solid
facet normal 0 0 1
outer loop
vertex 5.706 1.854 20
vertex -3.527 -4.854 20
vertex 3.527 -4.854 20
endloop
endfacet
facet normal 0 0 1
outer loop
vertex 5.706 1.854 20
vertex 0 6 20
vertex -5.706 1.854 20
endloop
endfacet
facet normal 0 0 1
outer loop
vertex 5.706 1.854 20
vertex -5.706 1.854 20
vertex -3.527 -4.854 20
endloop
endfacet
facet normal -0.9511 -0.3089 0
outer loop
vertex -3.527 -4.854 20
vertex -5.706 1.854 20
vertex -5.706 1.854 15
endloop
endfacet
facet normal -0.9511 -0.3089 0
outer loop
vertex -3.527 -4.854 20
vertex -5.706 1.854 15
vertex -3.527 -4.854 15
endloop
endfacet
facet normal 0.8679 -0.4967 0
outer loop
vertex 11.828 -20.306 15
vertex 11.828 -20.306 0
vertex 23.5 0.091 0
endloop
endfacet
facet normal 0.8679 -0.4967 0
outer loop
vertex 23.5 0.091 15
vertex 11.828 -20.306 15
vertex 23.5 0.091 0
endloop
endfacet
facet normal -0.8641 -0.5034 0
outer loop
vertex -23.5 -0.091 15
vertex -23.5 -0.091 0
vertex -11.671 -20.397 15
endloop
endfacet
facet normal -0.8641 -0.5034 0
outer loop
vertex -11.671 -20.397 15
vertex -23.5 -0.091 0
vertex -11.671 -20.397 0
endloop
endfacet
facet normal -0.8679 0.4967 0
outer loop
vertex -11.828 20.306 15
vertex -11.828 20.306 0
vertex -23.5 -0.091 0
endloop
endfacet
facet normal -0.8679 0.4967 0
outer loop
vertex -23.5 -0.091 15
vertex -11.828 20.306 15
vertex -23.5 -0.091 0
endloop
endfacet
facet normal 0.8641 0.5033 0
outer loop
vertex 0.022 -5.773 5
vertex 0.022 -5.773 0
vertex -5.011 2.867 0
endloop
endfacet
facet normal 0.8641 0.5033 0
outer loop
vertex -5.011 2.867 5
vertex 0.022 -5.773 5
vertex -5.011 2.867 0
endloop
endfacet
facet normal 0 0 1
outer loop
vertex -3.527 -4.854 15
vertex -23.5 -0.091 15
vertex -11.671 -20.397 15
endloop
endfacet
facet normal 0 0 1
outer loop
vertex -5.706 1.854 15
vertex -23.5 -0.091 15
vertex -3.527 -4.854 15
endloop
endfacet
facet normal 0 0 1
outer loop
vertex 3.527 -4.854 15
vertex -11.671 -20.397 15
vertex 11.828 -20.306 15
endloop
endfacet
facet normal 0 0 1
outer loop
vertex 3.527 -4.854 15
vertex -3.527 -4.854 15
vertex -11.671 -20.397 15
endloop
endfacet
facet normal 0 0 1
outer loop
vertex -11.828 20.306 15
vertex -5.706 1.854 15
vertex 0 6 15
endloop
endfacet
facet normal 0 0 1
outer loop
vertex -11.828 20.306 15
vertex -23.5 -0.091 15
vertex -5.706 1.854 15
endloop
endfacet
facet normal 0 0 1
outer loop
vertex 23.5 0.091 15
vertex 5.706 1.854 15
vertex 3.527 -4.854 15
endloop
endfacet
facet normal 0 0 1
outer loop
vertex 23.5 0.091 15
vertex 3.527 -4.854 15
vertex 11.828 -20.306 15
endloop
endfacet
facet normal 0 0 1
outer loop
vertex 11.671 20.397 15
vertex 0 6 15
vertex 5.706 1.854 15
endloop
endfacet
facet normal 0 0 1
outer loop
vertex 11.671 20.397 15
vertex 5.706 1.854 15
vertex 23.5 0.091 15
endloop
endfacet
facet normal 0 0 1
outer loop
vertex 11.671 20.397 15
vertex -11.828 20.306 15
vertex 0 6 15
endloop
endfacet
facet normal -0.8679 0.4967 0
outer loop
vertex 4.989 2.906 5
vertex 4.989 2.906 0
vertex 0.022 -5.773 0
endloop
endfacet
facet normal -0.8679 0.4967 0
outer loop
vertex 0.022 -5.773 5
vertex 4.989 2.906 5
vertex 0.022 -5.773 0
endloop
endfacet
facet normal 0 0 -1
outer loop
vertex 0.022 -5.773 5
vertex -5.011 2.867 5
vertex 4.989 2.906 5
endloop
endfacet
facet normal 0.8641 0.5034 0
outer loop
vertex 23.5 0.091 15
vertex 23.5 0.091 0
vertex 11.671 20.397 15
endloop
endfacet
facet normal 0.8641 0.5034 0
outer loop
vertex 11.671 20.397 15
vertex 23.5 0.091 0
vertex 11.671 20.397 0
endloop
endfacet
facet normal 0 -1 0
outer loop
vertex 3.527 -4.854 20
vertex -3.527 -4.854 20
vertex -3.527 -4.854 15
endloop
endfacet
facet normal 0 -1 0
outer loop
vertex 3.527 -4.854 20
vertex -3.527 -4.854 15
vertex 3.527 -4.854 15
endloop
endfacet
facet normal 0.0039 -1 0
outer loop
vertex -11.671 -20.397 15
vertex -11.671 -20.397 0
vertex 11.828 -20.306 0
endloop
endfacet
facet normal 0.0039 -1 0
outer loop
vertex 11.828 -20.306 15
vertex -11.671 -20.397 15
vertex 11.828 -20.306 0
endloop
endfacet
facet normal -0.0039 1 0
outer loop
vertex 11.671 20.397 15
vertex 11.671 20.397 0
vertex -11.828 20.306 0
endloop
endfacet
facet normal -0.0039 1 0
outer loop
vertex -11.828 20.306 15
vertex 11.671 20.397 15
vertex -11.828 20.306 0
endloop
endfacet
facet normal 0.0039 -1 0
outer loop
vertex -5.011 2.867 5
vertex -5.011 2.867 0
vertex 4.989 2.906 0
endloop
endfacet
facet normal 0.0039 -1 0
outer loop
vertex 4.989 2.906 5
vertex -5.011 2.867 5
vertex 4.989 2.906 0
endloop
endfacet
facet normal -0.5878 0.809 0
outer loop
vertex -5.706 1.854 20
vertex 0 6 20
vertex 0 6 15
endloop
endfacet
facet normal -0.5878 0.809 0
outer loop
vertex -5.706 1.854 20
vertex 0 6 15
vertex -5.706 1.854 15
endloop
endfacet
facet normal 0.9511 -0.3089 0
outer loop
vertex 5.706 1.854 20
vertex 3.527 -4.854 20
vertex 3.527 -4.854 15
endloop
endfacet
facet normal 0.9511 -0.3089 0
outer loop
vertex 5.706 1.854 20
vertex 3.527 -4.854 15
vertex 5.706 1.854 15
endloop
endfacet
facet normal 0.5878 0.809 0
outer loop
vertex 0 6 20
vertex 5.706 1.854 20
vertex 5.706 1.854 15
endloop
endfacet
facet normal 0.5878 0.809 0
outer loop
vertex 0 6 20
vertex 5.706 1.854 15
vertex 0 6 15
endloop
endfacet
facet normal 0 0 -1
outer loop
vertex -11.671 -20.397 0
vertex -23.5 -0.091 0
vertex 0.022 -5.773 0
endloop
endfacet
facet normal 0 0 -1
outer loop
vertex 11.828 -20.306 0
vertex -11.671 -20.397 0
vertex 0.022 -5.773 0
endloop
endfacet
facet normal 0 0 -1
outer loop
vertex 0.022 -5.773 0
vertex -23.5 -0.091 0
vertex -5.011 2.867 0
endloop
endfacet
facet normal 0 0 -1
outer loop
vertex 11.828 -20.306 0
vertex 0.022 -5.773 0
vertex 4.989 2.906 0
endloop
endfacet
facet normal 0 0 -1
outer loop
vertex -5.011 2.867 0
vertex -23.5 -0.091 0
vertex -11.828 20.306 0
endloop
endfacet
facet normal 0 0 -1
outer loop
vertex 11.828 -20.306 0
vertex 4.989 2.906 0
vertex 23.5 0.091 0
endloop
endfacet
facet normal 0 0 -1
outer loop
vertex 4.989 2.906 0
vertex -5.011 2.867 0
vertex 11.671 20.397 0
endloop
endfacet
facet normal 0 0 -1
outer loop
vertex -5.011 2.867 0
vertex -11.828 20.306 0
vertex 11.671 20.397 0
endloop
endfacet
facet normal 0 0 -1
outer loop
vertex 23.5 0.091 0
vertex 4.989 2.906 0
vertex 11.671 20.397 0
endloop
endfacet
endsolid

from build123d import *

# Parameters (mm, degrees)
F1_DEPTH = 15
F3_DEPTH = 5
F5_DEPTH = 5


with BuildPart() as f1:
    # F0 (on Top) → F1 (new body)
    with BuildSketch(Plane.XY):
        Polygon((-11.82836, 20.306155), (-23.499825, -0.090583), (-11.671466, -20.396737), (11.82836, -20.306155), (23.499825, 0.090583), (11.671466, 20.396737), align=None)
    extrude(amount=F1_DEPTH)

    # F2 (on face) → F3 (join, symmetric)
    with BuildSketch(Plane.XY.offset(15)):
        Polygon((-3.526712, -4.854102), (3.526712, -4.854102), (5.706339, 1.854102), (0, 6), (-5.706339, 1.854102), align=None)
    extrude(amount=F3_DEPTH, both=True)

    # F4 (on face) → F5 (cut)
    with BuildSketch(Plane(origin=(0, 0, 0), x_dir=(1, 0, 0), z_dir=(0, 0, -1))):
        Polygon((-5.01109, -2.867457), (4.988836, -2.906003), (0.022254, 5.77346), align=None)
    extrude(amount=-F5_DEPTH, mode=Mode.SUBTRACT)


solid = f1.part
